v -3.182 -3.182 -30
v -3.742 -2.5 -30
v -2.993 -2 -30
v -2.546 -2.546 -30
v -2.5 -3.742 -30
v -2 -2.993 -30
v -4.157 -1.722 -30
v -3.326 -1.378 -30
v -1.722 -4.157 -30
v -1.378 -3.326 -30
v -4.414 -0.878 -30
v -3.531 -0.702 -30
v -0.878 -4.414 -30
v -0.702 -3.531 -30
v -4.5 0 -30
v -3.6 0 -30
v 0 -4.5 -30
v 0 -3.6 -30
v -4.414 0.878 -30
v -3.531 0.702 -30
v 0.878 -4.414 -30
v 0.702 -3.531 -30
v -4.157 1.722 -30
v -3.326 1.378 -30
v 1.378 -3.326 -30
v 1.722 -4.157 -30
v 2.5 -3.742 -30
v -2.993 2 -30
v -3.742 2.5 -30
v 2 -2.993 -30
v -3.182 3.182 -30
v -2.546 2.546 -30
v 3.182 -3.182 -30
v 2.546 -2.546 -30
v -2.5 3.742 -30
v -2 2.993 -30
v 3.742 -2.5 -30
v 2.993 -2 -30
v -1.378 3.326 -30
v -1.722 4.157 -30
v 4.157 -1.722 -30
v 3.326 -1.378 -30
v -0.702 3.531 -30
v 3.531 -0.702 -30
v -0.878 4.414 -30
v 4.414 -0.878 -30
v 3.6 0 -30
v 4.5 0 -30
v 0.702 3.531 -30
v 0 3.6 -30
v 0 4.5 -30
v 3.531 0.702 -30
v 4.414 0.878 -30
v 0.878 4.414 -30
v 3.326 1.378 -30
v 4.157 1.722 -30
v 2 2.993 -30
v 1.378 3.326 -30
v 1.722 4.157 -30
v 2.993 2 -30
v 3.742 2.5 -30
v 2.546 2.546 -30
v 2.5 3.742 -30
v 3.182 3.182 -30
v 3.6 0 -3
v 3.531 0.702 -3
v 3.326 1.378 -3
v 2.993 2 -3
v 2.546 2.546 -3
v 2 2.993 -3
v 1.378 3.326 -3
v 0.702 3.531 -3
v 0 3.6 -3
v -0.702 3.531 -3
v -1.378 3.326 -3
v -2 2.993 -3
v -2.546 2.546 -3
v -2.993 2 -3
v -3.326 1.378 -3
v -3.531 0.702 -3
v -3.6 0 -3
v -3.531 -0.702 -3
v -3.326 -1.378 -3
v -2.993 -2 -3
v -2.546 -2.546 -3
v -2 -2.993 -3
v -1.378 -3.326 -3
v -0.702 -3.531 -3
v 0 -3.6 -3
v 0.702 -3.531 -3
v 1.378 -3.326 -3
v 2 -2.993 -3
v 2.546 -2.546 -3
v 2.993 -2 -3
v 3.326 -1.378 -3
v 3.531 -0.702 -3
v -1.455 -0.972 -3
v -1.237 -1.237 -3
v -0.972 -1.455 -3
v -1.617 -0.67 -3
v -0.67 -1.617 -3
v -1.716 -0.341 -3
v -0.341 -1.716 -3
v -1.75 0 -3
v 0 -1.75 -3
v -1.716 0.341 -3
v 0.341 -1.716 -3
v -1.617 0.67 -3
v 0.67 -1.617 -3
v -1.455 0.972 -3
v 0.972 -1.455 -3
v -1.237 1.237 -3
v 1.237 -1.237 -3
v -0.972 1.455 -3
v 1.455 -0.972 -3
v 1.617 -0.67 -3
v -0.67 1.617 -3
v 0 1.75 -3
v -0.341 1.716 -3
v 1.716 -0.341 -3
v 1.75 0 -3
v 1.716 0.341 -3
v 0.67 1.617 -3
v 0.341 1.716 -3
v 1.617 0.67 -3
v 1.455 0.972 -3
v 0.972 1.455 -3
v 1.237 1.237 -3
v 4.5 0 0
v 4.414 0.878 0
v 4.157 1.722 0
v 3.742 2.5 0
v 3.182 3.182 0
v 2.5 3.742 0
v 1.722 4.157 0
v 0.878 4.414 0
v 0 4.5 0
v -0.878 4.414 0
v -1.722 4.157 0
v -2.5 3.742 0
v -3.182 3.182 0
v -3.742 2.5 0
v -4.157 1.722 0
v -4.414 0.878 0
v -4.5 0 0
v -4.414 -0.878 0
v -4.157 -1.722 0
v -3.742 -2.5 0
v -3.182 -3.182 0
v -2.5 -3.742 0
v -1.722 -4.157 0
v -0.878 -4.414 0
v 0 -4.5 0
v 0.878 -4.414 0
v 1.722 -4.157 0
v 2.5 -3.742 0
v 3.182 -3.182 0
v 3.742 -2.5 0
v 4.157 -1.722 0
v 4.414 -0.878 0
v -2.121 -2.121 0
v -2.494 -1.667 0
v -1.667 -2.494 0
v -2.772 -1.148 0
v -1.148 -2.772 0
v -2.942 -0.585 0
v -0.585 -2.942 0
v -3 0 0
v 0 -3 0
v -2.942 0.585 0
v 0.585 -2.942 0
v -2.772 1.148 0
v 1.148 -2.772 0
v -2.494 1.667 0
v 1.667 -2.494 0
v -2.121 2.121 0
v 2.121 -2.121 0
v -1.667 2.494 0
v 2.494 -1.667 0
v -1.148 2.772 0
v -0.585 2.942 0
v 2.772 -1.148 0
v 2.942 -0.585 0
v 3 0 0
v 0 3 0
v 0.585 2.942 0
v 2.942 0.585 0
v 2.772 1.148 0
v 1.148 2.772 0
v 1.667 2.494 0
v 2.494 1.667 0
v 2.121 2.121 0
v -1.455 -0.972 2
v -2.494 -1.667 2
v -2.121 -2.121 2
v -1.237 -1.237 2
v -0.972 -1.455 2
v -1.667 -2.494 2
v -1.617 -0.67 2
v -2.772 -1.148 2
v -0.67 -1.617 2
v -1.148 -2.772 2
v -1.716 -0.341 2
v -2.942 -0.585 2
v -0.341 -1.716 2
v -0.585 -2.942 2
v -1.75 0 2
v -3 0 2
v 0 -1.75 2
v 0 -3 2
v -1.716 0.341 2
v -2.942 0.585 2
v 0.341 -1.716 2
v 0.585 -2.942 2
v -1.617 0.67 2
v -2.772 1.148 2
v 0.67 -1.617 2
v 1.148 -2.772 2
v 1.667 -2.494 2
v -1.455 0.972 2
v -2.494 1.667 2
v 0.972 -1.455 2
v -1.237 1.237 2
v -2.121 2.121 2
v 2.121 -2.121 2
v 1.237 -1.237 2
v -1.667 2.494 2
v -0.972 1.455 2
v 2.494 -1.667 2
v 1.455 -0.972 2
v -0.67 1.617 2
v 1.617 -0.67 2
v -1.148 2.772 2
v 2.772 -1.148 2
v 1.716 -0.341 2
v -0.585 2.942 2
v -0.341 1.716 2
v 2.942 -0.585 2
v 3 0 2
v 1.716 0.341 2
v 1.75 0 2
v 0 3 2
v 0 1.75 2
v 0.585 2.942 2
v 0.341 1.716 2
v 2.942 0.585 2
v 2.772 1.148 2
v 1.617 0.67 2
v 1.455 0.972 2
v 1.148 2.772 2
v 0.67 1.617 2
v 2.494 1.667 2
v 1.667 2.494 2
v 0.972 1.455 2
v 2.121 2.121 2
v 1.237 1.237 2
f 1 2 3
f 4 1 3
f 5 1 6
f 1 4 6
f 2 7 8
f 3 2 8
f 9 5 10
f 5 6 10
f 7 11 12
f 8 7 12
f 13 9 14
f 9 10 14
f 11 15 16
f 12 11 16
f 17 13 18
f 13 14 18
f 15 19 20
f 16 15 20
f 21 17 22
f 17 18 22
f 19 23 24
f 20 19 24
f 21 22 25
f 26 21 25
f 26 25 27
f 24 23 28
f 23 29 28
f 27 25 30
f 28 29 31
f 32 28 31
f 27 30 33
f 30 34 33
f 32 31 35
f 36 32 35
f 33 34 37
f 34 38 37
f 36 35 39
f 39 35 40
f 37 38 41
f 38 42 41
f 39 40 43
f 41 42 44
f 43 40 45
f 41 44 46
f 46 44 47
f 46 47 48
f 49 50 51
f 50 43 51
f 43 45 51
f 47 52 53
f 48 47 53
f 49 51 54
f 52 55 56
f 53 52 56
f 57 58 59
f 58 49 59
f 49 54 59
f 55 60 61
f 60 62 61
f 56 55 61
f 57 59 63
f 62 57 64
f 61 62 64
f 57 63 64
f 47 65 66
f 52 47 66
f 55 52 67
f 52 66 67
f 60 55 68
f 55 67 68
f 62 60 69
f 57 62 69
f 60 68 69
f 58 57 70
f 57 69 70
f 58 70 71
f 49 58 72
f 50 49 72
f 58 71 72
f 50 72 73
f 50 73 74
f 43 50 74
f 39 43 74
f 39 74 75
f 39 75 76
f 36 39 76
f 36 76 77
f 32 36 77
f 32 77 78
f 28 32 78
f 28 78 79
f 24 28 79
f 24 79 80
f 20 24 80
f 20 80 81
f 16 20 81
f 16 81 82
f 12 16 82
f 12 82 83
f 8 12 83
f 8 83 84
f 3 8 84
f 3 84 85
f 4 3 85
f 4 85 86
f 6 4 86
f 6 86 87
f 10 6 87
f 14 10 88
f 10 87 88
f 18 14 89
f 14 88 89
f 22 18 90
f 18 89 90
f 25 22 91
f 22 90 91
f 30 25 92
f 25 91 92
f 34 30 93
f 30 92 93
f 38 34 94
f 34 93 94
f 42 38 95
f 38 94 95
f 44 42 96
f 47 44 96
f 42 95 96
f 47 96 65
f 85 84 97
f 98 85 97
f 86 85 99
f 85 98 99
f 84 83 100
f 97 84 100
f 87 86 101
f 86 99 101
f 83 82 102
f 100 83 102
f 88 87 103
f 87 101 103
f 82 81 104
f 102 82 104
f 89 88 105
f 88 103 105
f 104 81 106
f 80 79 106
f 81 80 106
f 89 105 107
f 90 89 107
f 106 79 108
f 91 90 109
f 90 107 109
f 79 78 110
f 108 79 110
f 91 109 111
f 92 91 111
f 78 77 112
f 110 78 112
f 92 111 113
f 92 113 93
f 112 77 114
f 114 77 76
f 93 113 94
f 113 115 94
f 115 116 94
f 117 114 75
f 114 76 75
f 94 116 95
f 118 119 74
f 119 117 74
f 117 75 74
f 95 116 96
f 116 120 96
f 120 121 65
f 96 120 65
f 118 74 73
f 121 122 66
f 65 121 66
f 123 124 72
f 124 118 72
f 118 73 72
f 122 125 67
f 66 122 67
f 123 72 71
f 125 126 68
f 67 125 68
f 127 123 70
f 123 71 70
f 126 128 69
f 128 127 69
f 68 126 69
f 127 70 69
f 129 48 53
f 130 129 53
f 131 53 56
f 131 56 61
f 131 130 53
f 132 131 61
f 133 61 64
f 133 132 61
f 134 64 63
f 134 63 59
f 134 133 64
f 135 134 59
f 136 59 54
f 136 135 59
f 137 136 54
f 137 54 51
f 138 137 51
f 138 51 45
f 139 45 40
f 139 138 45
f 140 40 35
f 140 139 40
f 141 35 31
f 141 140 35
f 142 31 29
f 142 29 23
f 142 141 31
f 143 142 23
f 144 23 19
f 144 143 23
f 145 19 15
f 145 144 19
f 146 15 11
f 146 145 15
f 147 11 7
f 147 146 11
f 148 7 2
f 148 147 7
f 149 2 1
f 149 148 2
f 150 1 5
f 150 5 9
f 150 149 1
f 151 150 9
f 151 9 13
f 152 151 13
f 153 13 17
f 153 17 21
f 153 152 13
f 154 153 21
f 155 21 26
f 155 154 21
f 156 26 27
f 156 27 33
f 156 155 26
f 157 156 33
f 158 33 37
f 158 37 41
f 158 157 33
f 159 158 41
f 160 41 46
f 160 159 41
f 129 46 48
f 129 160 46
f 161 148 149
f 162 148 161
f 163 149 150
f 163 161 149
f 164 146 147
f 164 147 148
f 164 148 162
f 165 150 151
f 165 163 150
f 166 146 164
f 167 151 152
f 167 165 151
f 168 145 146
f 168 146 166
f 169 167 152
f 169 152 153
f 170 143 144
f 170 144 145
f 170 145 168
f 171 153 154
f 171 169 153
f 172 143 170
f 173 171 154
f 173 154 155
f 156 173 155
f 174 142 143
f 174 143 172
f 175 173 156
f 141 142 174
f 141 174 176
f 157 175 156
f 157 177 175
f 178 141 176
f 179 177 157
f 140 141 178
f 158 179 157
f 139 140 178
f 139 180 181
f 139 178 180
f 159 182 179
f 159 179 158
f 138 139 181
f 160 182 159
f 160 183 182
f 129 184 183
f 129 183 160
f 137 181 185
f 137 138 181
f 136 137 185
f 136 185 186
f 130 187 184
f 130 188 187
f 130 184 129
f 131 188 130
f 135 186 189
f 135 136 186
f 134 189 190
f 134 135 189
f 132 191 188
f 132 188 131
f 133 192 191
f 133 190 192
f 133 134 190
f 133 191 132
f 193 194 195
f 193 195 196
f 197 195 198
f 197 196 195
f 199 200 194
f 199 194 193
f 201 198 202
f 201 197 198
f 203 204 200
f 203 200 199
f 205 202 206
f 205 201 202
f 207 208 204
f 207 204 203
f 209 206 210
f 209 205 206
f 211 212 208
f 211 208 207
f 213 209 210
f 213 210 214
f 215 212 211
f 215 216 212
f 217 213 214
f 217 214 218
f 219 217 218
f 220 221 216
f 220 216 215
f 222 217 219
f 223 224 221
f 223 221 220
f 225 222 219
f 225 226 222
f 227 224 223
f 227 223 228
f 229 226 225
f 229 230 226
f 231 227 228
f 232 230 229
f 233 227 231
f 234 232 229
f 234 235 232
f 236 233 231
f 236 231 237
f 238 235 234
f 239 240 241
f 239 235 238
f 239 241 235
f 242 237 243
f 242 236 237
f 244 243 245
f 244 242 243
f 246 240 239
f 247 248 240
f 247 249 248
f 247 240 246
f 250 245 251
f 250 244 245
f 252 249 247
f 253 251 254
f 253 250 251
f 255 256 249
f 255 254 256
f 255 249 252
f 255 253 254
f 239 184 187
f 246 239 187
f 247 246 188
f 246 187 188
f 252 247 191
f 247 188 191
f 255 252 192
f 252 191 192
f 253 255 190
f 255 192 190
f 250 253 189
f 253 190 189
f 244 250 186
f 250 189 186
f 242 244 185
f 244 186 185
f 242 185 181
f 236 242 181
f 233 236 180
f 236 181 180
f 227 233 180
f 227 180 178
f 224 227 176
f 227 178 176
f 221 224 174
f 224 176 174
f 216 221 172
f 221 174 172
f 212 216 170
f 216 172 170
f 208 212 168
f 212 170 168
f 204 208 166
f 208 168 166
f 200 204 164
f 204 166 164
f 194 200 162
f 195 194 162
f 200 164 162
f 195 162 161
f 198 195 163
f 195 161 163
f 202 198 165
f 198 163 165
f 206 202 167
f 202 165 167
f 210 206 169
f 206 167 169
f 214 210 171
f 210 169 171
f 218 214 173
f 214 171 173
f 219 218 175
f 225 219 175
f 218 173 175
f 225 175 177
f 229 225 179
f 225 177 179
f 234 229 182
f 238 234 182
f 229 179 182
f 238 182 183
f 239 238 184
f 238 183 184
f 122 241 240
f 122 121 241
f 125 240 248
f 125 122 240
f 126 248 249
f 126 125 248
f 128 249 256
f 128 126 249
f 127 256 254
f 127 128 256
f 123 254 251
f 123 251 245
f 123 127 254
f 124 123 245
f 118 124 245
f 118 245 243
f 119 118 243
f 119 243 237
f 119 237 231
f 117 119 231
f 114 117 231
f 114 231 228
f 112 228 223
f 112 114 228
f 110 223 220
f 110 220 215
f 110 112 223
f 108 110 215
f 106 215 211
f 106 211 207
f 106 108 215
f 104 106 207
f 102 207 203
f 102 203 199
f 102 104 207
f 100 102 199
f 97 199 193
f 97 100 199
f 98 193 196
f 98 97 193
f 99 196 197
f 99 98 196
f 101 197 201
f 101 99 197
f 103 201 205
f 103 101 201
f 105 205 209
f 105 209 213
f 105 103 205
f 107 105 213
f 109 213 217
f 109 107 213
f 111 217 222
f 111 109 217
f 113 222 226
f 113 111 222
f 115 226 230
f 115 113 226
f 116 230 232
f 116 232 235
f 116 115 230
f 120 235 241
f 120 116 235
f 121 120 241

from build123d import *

# Parameters (mm, degrees)
F0_R     = 4.5
F0_R_2   = 3.6
F1_DEPTH = 30
F0_R_3   = 3
F0_R_4   = 1.75
F2_DEPTH = 3
F3_DEPTH = 2


with BuildPart() as f1:
    # F0 (on Top) → F1 (new body)
    with BuildSketch(Plane.XY):
        Circle(F0_R)
        Circle(F0_R_2, mode=Mode.SUBTRACT)
    extrude(amount=-F1_DEPTH)

    # F0 (on Top) → F2 (join)
    with BuildSketch(Plane.XY):
        Circle(F0_R_2)
        Circle(F0_R_3, mode=Mode.SUBTRACT)
        Circle(F0_R_3)
        Circle(F0_R_4, mode=Mode.SUBTRACT)
    extrude(amount=-F2_DEPTH)

    # F0 (on Top) → F3 (join)
    with BuildSketch(Plane.XY):
        Circle(F0_R_3)
        Circle(F0_R_4, mode=Mode.SUBTRACT)
    extrude(amount=F3_DEPTH)


solid = f1.part
